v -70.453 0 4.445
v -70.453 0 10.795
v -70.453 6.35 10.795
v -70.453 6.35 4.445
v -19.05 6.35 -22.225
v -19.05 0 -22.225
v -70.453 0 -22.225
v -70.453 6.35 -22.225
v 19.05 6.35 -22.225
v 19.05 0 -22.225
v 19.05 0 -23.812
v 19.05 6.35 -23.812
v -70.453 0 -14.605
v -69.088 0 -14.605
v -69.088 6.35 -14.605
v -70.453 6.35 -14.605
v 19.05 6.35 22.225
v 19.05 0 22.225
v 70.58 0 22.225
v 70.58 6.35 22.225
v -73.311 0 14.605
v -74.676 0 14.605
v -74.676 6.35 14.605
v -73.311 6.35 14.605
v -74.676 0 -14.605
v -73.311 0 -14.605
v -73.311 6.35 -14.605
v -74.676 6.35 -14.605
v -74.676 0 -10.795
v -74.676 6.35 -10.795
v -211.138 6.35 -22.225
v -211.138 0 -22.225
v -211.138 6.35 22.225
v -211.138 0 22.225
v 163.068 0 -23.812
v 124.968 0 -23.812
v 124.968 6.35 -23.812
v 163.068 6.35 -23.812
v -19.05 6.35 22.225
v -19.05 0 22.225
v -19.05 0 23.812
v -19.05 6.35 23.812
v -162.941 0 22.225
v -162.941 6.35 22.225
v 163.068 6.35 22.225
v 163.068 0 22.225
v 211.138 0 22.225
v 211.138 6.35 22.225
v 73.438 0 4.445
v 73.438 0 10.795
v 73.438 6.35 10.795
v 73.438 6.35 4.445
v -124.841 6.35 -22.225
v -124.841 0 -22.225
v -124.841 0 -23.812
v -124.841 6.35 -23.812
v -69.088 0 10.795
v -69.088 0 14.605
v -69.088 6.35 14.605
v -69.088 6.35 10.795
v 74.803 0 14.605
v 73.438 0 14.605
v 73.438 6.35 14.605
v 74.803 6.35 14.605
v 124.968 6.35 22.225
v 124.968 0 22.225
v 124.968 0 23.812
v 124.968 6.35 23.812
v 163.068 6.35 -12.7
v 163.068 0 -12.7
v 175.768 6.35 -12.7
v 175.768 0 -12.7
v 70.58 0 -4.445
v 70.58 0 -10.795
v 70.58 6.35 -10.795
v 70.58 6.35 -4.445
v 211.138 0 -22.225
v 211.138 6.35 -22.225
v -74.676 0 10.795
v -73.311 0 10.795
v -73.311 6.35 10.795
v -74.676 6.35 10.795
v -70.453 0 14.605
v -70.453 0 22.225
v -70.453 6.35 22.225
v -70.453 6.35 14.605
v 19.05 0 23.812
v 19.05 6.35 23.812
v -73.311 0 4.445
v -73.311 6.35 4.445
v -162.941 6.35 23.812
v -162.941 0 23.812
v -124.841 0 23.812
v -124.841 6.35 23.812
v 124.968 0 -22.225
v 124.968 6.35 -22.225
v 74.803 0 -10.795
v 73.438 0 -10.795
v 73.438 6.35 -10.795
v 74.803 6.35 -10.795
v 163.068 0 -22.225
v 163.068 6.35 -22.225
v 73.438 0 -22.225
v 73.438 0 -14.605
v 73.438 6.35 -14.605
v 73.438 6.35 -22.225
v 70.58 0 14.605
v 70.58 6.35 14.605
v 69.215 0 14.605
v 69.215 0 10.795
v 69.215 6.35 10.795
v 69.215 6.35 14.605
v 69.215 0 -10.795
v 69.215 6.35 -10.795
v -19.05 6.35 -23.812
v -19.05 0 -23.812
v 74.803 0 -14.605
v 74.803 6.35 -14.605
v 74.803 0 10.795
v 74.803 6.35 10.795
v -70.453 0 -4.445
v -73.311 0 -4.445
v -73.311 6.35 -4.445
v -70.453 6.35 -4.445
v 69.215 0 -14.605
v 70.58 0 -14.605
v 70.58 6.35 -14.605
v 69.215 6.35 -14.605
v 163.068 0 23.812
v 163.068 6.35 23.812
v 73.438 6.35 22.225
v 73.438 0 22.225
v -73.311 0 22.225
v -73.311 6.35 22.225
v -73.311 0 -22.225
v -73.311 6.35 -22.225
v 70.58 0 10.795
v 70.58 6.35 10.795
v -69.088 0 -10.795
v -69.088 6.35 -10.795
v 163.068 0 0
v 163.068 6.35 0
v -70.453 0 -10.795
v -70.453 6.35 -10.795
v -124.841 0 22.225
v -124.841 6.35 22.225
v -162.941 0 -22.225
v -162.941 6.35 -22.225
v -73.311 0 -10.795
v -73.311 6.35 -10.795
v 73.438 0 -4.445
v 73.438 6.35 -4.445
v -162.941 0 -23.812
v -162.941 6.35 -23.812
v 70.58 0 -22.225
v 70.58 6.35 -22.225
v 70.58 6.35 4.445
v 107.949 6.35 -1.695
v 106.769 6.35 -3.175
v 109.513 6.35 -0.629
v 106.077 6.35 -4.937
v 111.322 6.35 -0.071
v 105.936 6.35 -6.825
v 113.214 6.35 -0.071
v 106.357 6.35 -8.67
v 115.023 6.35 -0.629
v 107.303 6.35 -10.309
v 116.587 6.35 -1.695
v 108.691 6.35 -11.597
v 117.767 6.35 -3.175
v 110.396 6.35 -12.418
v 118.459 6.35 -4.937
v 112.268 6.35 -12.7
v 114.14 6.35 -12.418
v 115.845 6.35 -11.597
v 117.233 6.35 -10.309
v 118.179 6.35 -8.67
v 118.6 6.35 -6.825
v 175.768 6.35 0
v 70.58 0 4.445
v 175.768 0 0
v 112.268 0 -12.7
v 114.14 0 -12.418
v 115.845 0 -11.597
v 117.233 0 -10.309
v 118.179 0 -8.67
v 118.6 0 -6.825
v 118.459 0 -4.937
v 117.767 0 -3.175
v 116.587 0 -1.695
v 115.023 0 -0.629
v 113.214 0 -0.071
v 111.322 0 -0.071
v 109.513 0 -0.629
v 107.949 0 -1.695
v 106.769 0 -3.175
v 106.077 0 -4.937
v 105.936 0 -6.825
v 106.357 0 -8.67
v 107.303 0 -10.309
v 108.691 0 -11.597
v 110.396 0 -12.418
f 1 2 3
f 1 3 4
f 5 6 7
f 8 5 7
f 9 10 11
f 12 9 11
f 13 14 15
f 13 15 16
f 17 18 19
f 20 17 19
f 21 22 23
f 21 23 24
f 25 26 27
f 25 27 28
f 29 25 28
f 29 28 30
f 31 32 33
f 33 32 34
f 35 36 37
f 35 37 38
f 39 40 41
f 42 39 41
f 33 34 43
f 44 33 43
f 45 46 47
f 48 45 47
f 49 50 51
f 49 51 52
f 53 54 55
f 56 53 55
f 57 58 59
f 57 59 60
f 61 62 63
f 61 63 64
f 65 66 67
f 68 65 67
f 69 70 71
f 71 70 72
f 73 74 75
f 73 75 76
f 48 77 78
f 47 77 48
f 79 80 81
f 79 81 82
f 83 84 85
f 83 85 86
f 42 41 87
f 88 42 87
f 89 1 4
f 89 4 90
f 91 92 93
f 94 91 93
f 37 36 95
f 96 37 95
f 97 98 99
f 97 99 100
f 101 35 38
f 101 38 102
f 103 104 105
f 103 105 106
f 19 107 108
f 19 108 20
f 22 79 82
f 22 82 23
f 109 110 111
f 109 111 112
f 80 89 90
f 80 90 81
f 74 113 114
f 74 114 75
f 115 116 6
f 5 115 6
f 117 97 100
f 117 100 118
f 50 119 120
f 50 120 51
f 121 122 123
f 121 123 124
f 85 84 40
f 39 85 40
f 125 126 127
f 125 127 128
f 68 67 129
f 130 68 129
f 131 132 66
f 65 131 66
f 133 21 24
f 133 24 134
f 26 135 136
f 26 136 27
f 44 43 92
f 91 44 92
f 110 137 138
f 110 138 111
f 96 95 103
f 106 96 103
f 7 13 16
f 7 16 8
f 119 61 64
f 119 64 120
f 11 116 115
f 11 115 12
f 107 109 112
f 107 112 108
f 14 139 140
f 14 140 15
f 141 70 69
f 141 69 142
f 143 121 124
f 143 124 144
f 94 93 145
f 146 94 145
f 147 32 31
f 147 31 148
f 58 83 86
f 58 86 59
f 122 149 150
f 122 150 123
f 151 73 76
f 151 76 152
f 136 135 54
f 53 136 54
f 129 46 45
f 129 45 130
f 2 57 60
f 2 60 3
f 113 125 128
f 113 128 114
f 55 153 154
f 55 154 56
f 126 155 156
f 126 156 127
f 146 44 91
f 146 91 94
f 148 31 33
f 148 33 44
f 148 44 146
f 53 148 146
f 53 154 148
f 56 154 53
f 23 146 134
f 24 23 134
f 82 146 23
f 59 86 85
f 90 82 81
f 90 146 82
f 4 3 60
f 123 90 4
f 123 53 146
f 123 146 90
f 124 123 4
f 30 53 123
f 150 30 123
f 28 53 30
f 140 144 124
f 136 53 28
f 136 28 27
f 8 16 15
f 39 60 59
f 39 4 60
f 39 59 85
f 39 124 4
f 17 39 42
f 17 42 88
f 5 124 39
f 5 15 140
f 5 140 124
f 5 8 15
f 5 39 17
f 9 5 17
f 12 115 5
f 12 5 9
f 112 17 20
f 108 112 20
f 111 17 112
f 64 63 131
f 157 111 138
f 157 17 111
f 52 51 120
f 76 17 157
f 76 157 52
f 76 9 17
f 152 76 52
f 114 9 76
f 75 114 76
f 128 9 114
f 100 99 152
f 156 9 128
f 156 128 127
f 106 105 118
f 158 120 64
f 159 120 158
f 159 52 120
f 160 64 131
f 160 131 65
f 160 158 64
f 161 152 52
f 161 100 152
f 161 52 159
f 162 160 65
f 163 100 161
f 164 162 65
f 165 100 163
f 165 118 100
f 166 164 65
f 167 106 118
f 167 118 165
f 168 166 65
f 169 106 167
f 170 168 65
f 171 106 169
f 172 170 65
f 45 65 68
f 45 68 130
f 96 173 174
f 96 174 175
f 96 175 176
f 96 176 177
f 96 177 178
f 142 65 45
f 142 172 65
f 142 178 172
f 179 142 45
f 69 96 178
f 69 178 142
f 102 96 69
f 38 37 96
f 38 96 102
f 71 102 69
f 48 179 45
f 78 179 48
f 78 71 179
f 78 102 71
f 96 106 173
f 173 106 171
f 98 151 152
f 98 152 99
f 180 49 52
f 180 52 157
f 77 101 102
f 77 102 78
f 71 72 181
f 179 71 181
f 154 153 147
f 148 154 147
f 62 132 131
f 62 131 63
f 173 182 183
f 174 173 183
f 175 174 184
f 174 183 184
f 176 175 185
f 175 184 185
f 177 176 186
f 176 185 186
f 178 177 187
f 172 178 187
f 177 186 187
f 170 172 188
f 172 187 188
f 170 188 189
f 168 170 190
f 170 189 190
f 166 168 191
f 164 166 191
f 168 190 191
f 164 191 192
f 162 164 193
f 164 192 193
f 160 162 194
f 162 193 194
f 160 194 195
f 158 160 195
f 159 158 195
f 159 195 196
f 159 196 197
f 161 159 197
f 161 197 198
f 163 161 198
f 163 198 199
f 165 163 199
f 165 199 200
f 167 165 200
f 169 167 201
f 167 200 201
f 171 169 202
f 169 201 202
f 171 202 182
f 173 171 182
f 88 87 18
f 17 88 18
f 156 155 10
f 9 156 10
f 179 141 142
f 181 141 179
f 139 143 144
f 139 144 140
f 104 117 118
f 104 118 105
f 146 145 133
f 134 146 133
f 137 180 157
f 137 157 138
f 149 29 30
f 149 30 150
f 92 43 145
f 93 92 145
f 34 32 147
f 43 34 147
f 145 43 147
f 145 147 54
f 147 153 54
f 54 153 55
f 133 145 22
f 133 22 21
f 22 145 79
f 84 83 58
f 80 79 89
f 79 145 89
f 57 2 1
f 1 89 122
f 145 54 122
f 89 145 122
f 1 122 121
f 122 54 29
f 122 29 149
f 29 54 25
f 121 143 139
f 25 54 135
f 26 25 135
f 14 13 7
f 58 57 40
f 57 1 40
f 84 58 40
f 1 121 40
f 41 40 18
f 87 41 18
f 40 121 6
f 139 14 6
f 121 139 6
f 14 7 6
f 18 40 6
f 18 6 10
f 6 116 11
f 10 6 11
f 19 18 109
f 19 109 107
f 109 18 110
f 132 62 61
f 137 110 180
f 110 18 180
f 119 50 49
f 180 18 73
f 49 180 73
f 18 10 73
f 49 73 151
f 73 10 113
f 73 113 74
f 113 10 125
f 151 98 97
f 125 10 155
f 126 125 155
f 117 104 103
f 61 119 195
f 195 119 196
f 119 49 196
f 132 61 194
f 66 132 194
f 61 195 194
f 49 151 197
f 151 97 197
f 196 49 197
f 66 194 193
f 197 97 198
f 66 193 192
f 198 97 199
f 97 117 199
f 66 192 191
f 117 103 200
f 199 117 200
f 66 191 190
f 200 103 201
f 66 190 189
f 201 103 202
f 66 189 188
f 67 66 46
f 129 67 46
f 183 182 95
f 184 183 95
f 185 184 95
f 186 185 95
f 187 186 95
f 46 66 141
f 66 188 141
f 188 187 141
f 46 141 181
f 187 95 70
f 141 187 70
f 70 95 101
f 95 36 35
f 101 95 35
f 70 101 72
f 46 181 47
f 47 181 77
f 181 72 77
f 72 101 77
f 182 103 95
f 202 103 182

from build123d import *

# Parameters (mm, degrees)
SKETCH1_W           = 428.625
SKETCH1_H           = 47.625
BOSS_EXTRUDE1_DEPTH = 6.35
SKETCH2_W           = 51.2445
SKETCH2_H           = 1.5875
SKETCH2_W_2         = 51.3715
CUT_EXTRUDE4_DEPTH  = 6.35
SKETCH4_W           = 3.175
SKETCH4_H           = 44.45
CUT_EXTRUDE5_DEPTH  = 6.35
SKETCH3_R           = 6.35
SKETCH3_W           = 12.7
SKETCH3_H           = 12.7
CUT_EXTRUDE6_DEPTH  = 6.35


with BuildPart() as part:
    # Sketch1 → Boss-Extrude1 (new body)
    with BuildSketch(Plane(origin=(0, 0, 0), x_dir=(1, 0, 0), z_dir=(0, 1, 0))):
        Rectangle(SKETCH1_W, SKETCH1_H)
    extrude(amount=BOSS_EXTRUDE1_DEPTH)

    # Sketch2 → Cut-Extrude4 (cut)
    with BuildSketch(Plane.XZ):
        Polygon((-124.841, -22.225), (-124.841, -23.8125), (-19.05, -23.8125), (-19.05, -22.225), (-70.45325, -22.225), (-73.31075, -22.225), align=None)
        with Locations((188.69025, 23.01875)):
            Rectangle(SKETCH2_W, SKETCH2_H)
        Polygon((19.05, 23.8125), (19.05, 22.225), (70.58025, 22.225), (73.43775, 22.225), (124.968, 22.225), (124.968, 23.8125), align=None)
        Polygon((-124.841, 22.225), (-73.31075, 22.225), (-70.45325, 22.225), (-19.05, 22.225), (-19.05, 23.8125), (-124.841, 23.8125), align=None)
        Polygon((19.05, -22.225), (19.05, -23.8125), (124.968, -23.8125), (124.968, -22.225), (73.43775, -22.225), (70.58025, -22.225), align=None)
        with Locations((188.69025, -23.01875)):
            Rectangle(SKETCH2_W, SKETCH2_H)
        with Locations((-188.62675, 23.01875)):
            Rectangle(SKETCH2_W_2, SKETCH2_H)
        with Locations((-188.62675, -23.01875)):
            Rectangle(SKETCH2_W_2, SKETCH2_H)
        Polygon((-70.45325, -4.445), (-70.45325, -10.795), (-69.088, -10.795), (-69.088, -14.605), (-70.45325, -14.605), (-70.45325, -22.225), (-73.31075, -22.225), (-73.31075, -14.605), (-74.676, -14.605), (-74.676, -10.795), (-73.31075, -10.795), (-73.31075, -4.445), align=None)
        Polygon((-70.45325, 4.445), (-73.31075, 4.445), (-73.31075, 10.795), (-74.676, 10.795), (-74.676, 14.605), (-73.31075, 14.605), (-73.31075, 22.225), (-70.45325, 22.225), (-70.45325, 14.605), (-69.088, 14.605), (-69.088, 10.795), (-70.45325, 10.795), align=None)
        Polygon((73.43775, 4.445), (70.58025, 4.445), (70.58025, 10.795), (69.215, 10.795), (69.215, 14.605), (70.58025, 14.605), (70.58025, 22.225), (73.43775, 22.225), (73.43775, 14.605), (74.803, 14.605), (74.803, 10.795), (73.43775, 10.795), align=None)
        Polygon((73.43775, -4.445), (73.43775, -10.795), (74.803, -10.795), (74.803, -14.605), (73.43775, -14.605), (73.43775, -22.225), (70.58025, -22.225), (70.58025, -14.605), (69.215, -14.605), (69.215, -10.795), (70.58025, -10.795), (70.58025, -4.445), align=None)
    extrude(amount=-CUT_EXTRUDE4_DEPTH, mode=Mode.SUBTRACT)

    # Sketch4 → Cut-Extrude5 (cut)
    with BuildSketch(Plane.XZ):
        with Locations((-212.725, 0)):
            Rectangle(SKETCH4_W, SKETCH4_H)
        with Locations((212.725, 0)):
            Rectangle(SKETCH4_W, SKETCH4_H)
    extrude(amount=-CUT_EXTRUDE5_DEPTH, mode=Mode.SUBTRACT)

    # Sketch3 → Cut-Extrude6 (cut)
    with BuildSketch(Plane.XZ):
        with Locations(Location((112.268, -6.35, 0), (0, 0, 270))):
            Circle(SKETCH3_R)
        with Locations((169.418, -6.35)):
            Rectangle(SKETCH3_W, SKETCH3_H)
    extrude(amount=-CUT_EXTRUDE6_DEPTH, mode=Mode.SUBTRACT)


solid = part.part
